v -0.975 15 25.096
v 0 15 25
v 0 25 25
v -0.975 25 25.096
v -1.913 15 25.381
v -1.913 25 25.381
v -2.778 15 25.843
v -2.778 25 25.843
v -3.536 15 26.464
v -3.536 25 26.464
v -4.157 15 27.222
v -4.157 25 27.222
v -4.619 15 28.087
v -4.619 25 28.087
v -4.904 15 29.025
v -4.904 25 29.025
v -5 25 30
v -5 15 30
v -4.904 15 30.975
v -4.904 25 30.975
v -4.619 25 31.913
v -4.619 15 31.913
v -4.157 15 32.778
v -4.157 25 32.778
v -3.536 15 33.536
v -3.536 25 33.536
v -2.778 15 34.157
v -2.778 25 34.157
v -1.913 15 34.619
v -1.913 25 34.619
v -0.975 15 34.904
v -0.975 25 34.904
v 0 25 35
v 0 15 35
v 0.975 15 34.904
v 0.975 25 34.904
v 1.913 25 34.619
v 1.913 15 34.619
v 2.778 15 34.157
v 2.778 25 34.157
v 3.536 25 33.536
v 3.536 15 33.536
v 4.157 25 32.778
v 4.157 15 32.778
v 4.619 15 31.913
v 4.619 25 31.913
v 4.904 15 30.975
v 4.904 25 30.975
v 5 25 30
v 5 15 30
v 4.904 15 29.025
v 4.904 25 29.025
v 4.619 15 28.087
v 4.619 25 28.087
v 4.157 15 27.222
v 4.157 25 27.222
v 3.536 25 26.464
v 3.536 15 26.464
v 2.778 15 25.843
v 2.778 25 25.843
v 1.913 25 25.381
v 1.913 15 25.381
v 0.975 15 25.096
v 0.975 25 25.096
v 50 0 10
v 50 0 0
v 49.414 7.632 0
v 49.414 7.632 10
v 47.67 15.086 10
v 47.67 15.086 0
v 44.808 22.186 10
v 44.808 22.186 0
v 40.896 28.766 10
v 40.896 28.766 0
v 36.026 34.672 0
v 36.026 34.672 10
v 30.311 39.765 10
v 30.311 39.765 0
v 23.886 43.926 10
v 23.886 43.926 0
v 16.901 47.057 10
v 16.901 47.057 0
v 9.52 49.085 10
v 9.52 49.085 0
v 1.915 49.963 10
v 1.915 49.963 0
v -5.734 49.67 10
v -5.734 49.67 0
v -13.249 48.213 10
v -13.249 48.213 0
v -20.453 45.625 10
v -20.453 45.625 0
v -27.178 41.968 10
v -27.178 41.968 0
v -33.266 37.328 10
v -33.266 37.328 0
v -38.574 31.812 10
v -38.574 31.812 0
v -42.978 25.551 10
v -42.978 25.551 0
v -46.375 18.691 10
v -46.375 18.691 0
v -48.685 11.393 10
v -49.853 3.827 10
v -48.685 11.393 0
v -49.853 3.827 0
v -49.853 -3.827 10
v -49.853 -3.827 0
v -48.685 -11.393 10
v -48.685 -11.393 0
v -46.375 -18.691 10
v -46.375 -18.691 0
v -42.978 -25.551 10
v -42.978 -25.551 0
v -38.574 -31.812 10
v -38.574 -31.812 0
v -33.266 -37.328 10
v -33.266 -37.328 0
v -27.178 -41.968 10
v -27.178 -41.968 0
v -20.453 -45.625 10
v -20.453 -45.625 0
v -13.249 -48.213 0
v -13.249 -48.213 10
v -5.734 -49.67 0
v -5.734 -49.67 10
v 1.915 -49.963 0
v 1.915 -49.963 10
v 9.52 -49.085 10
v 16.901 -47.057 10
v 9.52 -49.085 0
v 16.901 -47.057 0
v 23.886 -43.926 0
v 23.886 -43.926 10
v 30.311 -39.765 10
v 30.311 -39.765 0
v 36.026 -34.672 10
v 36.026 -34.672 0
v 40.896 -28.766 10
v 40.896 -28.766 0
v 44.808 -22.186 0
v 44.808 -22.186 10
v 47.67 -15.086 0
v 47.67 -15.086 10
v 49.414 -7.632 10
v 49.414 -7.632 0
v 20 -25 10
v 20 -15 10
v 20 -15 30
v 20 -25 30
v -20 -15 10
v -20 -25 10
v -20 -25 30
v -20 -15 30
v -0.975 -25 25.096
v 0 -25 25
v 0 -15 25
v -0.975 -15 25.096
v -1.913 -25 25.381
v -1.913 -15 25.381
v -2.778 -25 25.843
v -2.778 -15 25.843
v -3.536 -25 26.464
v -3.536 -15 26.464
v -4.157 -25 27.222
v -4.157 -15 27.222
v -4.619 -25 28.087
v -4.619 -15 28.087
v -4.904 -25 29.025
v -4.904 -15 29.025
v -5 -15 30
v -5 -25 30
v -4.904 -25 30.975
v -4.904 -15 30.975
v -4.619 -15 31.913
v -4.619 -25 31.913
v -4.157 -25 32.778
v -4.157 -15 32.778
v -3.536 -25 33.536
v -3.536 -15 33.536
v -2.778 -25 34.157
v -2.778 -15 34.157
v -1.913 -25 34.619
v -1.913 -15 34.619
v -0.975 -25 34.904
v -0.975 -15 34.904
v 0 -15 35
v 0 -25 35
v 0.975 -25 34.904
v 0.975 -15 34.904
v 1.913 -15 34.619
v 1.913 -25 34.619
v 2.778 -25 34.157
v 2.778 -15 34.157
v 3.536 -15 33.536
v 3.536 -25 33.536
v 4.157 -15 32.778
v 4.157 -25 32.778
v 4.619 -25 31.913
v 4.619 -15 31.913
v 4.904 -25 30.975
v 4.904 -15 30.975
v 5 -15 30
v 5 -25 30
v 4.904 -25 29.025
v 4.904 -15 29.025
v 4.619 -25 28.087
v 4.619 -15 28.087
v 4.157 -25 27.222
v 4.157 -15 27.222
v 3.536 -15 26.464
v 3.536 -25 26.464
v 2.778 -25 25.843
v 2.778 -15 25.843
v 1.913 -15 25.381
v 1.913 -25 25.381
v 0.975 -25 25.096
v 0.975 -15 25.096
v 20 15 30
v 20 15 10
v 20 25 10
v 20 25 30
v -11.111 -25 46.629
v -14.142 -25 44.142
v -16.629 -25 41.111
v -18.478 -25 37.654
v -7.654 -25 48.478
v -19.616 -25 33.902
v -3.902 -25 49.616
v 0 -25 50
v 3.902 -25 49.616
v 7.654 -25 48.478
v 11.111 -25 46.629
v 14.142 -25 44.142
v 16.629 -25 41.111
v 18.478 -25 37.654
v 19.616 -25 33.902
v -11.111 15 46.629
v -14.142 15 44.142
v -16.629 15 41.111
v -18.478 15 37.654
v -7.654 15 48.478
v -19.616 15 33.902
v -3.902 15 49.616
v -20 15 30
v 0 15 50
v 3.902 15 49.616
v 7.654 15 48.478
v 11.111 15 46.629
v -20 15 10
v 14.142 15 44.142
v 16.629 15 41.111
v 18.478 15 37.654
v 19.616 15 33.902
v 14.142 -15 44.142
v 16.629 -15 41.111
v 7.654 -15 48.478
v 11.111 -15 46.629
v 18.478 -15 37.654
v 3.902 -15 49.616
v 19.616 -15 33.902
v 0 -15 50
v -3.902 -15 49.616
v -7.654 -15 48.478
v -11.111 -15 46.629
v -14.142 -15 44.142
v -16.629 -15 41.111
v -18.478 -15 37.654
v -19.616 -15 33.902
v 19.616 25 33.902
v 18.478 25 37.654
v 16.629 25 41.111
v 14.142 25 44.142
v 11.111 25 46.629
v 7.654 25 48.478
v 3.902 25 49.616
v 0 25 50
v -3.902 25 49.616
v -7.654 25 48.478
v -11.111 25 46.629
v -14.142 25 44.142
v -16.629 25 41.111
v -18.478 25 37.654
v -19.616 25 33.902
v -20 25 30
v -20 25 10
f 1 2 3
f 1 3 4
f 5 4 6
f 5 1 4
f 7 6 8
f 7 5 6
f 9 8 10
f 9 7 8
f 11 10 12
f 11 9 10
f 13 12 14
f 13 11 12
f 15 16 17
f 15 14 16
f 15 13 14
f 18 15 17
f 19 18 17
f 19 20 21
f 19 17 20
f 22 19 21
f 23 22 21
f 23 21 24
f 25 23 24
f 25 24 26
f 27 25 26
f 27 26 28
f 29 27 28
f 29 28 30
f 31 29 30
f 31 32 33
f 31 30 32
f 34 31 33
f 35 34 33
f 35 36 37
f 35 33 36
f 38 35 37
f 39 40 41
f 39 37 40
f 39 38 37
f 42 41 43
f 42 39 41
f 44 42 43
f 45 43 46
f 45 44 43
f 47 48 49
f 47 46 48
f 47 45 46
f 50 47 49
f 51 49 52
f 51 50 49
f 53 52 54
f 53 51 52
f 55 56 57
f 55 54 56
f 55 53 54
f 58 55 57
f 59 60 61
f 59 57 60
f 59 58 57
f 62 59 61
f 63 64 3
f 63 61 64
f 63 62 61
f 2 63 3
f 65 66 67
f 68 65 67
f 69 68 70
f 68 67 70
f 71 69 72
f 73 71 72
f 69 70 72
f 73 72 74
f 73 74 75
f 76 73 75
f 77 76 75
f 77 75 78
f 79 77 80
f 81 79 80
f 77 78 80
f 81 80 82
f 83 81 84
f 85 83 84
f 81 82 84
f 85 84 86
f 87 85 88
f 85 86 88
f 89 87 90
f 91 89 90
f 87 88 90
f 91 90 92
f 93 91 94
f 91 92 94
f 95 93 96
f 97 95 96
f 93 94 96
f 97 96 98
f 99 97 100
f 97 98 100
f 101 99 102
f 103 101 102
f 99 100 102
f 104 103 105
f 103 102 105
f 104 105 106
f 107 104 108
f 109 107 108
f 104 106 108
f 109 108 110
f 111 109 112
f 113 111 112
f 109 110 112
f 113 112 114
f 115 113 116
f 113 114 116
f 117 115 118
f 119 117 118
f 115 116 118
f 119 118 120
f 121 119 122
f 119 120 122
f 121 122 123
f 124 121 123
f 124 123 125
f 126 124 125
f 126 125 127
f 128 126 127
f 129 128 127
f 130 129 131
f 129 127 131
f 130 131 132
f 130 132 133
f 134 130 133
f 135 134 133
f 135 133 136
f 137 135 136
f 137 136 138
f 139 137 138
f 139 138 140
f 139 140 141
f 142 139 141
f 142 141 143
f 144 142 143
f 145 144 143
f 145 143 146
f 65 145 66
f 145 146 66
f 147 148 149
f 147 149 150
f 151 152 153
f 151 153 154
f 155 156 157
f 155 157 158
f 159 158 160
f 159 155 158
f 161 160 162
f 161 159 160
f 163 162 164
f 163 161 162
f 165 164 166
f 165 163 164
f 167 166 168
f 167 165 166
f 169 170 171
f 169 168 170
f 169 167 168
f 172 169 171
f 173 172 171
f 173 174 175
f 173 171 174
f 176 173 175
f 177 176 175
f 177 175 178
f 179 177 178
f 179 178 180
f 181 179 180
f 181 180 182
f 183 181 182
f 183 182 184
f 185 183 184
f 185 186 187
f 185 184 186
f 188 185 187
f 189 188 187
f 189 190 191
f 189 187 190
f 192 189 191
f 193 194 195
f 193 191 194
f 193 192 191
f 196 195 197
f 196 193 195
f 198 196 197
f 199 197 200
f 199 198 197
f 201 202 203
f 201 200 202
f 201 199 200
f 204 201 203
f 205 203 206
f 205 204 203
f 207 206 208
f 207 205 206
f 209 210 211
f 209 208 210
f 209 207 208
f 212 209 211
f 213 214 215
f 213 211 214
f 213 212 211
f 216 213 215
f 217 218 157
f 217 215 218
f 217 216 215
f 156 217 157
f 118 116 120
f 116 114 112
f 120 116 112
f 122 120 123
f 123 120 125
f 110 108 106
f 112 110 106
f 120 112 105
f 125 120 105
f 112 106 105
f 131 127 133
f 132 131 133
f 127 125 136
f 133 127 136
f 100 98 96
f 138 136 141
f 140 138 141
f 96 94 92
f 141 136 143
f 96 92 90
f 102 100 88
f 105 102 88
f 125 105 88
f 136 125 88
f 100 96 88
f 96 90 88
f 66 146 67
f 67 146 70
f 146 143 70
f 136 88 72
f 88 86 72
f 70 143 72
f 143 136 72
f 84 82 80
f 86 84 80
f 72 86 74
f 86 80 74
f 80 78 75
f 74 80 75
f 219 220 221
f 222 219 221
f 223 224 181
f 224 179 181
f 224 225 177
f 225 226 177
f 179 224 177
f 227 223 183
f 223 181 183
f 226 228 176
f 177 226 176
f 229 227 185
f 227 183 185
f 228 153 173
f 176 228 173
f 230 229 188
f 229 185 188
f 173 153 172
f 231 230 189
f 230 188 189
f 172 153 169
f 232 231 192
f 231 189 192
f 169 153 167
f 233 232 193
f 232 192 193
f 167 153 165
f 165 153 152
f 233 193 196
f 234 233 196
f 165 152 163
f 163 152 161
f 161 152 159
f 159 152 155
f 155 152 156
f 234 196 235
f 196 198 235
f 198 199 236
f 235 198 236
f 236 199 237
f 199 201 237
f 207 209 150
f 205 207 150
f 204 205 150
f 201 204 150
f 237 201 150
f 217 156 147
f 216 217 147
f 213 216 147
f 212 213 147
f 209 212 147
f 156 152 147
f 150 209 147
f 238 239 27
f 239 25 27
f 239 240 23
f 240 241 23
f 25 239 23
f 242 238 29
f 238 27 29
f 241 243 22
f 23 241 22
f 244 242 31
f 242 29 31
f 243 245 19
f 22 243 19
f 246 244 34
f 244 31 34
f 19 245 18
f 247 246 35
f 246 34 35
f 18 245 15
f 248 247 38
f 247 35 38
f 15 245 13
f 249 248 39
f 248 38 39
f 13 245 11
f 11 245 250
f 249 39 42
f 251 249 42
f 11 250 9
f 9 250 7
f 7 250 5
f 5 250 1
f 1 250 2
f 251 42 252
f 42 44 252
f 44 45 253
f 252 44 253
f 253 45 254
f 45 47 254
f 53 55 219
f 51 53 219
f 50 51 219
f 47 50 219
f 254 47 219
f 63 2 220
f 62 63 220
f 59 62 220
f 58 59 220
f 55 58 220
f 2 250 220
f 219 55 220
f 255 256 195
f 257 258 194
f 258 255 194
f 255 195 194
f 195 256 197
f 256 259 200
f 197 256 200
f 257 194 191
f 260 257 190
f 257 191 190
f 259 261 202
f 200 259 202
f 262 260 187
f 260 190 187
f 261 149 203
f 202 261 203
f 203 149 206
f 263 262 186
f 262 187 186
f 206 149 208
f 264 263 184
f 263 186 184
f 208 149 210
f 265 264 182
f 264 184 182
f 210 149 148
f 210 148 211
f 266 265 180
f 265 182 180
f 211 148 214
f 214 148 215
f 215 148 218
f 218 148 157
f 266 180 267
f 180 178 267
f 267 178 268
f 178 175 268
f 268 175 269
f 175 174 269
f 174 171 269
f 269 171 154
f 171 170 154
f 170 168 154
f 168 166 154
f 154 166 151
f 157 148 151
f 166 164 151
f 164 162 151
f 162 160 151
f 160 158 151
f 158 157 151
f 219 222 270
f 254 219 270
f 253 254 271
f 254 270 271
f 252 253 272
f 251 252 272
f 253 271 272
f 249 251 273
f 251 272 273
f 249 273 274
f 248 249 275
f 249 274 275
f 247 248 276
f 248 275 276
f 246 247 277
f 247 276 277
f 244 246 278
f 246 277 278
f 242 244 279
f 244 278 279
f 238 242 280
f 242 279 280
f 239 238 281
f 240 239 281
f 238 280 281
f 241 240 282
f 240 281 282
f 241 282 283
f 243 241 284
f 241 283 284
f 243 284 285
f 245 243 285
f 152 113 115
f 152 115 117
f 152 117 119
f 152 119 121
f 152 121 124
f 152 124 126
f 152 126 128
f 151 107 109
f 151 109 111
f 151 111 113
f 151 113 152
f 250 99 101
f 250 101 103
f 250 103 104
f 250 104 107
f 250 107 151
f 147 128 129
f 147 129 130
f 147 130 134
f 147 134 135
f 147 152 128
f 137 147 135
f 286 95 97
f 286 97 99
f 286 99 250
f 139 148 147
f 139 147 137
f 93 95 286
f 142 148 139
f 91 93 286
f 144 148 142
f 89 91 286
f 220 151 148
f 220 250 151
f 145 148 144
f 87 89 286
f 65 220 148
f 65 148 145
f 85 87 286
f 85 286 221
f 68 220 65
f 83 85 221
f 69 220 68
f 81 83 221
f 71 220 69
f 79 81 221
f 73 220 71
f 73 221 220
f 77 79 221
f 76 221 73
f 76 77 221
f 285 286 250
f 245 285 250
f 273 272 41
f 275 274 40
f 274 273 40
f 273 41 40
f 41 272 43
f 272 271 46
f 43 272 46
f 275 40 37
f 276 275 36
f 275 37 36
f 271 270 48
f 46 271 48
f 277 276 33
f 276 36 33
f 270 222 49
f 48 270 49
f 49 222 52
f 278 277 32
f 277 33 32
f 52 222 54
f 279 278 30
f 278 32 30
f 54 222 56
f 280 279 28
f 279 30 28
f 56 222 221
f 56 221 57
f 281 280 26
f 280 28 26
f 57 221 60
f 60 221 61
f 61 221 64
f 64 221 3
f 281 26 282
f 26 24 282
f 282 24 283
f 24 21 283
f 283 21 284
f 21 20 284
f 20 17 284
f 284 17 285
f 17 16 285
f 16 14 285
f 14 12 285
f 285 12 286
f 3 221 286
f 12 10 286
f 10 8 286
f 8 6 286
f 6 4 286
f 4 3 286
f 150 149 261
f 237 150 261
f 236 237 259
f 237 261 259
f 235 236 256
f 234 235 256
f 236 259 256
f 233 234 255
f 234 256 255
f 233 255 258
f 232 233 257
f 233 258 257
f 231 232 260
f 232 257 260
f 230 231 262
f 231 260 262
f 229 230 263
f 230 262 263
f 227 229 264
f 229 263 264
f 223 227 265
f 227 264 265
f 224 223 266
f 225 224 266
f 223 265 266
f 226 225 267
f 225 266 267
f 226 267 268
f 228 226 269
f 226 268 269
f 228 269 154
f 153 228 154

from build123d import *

# Parameters (mm, degrees)
SKETCH1_R               = 50
BOSS_EXTRUDE1_DEPTH     = 10
BOSS_EXTRUDE2_DEPTH     = 40
CUT_EXTRUDE1_DEPTH      = 10
CUT_EXTRUDE1_DEPTH_BACK = 51
SKETCH3_R               = 5
CUT_EXTRUDE3_DEPTH      = 51
CUT_EXTRUDE3_DEPTH_BACK = 51


with BuildPart() as part:
    # Sketch1 → Boss-Extrude1 (new body)
    with BuildSketch(Plane.XY):
        Circle(SKETCH1_R)
    extrude(amount=BOSS_EXTRUDE1_DEPTH)

    # Sketch2 → Boss-Extrude2 (add)
    with BuildSketch(Plane.XY.offset(10)):
        Polygon((0, 15), (20, 15), (20, 25), (0, 25), (-20, 25), (-20, 15), align=None)
        Polygon((0, -15), (20, -15), (20, -25), (0, -25), (-20, -25), (-20, -15), align=None)
    extrude(amount=BOSS_EXTRUDE2_DEPTH)

    # Sketch3 → Cut-Extrude1 (cut, two sides: drawn at the far end of the back side and taken through both)
    with BuildSketch(Plane(origin=(0, 25, 0), x_dir=(1, 0, 0), z_dir=(0, 1, 0)).offset(-CUT_EXTRUDE1_DEPTH_BACK)):
        with Locations((0, -30)):
            Circle(SKETCH3_R)
    extrude(amount=CUT_EXTRUDE1_DEPTH + CUT_EXTRUDE1_DEPTH_BACK, mode=Mode.SUBTRACT)

    # Sketch4 → Cut-Extrude3 (cut, two sides: drawn at the far end of the back side and taken through both)
    with BuildSketch(Plane.XZ.offset(25).offset(-CUT_EXTRUDE3_DEPTH_BACK)):
        with BuildLine():
            Line((-20, 30), (-47.366486711, 30))
            Line((-47.366486711, 30), (-38.964183934, 74.74544014))
            Line((-38.964183934, 74.74544014), (40.839267743, 70.572196031))
            Line((40.839267743, 70.572196031), (55.137019974, 30))
            Line((55.137019974, 30), (20, 30))
            ThreePointArc((20, 30), (0, 50), (-20, 30))
        make_face()
    extrude(amount=CUT_EXTRUDE3_DEPTH + CUT_EXTRUDE3_DEPTH_BACK, mode=Mode.SUBTRACT)


solid = part.part
